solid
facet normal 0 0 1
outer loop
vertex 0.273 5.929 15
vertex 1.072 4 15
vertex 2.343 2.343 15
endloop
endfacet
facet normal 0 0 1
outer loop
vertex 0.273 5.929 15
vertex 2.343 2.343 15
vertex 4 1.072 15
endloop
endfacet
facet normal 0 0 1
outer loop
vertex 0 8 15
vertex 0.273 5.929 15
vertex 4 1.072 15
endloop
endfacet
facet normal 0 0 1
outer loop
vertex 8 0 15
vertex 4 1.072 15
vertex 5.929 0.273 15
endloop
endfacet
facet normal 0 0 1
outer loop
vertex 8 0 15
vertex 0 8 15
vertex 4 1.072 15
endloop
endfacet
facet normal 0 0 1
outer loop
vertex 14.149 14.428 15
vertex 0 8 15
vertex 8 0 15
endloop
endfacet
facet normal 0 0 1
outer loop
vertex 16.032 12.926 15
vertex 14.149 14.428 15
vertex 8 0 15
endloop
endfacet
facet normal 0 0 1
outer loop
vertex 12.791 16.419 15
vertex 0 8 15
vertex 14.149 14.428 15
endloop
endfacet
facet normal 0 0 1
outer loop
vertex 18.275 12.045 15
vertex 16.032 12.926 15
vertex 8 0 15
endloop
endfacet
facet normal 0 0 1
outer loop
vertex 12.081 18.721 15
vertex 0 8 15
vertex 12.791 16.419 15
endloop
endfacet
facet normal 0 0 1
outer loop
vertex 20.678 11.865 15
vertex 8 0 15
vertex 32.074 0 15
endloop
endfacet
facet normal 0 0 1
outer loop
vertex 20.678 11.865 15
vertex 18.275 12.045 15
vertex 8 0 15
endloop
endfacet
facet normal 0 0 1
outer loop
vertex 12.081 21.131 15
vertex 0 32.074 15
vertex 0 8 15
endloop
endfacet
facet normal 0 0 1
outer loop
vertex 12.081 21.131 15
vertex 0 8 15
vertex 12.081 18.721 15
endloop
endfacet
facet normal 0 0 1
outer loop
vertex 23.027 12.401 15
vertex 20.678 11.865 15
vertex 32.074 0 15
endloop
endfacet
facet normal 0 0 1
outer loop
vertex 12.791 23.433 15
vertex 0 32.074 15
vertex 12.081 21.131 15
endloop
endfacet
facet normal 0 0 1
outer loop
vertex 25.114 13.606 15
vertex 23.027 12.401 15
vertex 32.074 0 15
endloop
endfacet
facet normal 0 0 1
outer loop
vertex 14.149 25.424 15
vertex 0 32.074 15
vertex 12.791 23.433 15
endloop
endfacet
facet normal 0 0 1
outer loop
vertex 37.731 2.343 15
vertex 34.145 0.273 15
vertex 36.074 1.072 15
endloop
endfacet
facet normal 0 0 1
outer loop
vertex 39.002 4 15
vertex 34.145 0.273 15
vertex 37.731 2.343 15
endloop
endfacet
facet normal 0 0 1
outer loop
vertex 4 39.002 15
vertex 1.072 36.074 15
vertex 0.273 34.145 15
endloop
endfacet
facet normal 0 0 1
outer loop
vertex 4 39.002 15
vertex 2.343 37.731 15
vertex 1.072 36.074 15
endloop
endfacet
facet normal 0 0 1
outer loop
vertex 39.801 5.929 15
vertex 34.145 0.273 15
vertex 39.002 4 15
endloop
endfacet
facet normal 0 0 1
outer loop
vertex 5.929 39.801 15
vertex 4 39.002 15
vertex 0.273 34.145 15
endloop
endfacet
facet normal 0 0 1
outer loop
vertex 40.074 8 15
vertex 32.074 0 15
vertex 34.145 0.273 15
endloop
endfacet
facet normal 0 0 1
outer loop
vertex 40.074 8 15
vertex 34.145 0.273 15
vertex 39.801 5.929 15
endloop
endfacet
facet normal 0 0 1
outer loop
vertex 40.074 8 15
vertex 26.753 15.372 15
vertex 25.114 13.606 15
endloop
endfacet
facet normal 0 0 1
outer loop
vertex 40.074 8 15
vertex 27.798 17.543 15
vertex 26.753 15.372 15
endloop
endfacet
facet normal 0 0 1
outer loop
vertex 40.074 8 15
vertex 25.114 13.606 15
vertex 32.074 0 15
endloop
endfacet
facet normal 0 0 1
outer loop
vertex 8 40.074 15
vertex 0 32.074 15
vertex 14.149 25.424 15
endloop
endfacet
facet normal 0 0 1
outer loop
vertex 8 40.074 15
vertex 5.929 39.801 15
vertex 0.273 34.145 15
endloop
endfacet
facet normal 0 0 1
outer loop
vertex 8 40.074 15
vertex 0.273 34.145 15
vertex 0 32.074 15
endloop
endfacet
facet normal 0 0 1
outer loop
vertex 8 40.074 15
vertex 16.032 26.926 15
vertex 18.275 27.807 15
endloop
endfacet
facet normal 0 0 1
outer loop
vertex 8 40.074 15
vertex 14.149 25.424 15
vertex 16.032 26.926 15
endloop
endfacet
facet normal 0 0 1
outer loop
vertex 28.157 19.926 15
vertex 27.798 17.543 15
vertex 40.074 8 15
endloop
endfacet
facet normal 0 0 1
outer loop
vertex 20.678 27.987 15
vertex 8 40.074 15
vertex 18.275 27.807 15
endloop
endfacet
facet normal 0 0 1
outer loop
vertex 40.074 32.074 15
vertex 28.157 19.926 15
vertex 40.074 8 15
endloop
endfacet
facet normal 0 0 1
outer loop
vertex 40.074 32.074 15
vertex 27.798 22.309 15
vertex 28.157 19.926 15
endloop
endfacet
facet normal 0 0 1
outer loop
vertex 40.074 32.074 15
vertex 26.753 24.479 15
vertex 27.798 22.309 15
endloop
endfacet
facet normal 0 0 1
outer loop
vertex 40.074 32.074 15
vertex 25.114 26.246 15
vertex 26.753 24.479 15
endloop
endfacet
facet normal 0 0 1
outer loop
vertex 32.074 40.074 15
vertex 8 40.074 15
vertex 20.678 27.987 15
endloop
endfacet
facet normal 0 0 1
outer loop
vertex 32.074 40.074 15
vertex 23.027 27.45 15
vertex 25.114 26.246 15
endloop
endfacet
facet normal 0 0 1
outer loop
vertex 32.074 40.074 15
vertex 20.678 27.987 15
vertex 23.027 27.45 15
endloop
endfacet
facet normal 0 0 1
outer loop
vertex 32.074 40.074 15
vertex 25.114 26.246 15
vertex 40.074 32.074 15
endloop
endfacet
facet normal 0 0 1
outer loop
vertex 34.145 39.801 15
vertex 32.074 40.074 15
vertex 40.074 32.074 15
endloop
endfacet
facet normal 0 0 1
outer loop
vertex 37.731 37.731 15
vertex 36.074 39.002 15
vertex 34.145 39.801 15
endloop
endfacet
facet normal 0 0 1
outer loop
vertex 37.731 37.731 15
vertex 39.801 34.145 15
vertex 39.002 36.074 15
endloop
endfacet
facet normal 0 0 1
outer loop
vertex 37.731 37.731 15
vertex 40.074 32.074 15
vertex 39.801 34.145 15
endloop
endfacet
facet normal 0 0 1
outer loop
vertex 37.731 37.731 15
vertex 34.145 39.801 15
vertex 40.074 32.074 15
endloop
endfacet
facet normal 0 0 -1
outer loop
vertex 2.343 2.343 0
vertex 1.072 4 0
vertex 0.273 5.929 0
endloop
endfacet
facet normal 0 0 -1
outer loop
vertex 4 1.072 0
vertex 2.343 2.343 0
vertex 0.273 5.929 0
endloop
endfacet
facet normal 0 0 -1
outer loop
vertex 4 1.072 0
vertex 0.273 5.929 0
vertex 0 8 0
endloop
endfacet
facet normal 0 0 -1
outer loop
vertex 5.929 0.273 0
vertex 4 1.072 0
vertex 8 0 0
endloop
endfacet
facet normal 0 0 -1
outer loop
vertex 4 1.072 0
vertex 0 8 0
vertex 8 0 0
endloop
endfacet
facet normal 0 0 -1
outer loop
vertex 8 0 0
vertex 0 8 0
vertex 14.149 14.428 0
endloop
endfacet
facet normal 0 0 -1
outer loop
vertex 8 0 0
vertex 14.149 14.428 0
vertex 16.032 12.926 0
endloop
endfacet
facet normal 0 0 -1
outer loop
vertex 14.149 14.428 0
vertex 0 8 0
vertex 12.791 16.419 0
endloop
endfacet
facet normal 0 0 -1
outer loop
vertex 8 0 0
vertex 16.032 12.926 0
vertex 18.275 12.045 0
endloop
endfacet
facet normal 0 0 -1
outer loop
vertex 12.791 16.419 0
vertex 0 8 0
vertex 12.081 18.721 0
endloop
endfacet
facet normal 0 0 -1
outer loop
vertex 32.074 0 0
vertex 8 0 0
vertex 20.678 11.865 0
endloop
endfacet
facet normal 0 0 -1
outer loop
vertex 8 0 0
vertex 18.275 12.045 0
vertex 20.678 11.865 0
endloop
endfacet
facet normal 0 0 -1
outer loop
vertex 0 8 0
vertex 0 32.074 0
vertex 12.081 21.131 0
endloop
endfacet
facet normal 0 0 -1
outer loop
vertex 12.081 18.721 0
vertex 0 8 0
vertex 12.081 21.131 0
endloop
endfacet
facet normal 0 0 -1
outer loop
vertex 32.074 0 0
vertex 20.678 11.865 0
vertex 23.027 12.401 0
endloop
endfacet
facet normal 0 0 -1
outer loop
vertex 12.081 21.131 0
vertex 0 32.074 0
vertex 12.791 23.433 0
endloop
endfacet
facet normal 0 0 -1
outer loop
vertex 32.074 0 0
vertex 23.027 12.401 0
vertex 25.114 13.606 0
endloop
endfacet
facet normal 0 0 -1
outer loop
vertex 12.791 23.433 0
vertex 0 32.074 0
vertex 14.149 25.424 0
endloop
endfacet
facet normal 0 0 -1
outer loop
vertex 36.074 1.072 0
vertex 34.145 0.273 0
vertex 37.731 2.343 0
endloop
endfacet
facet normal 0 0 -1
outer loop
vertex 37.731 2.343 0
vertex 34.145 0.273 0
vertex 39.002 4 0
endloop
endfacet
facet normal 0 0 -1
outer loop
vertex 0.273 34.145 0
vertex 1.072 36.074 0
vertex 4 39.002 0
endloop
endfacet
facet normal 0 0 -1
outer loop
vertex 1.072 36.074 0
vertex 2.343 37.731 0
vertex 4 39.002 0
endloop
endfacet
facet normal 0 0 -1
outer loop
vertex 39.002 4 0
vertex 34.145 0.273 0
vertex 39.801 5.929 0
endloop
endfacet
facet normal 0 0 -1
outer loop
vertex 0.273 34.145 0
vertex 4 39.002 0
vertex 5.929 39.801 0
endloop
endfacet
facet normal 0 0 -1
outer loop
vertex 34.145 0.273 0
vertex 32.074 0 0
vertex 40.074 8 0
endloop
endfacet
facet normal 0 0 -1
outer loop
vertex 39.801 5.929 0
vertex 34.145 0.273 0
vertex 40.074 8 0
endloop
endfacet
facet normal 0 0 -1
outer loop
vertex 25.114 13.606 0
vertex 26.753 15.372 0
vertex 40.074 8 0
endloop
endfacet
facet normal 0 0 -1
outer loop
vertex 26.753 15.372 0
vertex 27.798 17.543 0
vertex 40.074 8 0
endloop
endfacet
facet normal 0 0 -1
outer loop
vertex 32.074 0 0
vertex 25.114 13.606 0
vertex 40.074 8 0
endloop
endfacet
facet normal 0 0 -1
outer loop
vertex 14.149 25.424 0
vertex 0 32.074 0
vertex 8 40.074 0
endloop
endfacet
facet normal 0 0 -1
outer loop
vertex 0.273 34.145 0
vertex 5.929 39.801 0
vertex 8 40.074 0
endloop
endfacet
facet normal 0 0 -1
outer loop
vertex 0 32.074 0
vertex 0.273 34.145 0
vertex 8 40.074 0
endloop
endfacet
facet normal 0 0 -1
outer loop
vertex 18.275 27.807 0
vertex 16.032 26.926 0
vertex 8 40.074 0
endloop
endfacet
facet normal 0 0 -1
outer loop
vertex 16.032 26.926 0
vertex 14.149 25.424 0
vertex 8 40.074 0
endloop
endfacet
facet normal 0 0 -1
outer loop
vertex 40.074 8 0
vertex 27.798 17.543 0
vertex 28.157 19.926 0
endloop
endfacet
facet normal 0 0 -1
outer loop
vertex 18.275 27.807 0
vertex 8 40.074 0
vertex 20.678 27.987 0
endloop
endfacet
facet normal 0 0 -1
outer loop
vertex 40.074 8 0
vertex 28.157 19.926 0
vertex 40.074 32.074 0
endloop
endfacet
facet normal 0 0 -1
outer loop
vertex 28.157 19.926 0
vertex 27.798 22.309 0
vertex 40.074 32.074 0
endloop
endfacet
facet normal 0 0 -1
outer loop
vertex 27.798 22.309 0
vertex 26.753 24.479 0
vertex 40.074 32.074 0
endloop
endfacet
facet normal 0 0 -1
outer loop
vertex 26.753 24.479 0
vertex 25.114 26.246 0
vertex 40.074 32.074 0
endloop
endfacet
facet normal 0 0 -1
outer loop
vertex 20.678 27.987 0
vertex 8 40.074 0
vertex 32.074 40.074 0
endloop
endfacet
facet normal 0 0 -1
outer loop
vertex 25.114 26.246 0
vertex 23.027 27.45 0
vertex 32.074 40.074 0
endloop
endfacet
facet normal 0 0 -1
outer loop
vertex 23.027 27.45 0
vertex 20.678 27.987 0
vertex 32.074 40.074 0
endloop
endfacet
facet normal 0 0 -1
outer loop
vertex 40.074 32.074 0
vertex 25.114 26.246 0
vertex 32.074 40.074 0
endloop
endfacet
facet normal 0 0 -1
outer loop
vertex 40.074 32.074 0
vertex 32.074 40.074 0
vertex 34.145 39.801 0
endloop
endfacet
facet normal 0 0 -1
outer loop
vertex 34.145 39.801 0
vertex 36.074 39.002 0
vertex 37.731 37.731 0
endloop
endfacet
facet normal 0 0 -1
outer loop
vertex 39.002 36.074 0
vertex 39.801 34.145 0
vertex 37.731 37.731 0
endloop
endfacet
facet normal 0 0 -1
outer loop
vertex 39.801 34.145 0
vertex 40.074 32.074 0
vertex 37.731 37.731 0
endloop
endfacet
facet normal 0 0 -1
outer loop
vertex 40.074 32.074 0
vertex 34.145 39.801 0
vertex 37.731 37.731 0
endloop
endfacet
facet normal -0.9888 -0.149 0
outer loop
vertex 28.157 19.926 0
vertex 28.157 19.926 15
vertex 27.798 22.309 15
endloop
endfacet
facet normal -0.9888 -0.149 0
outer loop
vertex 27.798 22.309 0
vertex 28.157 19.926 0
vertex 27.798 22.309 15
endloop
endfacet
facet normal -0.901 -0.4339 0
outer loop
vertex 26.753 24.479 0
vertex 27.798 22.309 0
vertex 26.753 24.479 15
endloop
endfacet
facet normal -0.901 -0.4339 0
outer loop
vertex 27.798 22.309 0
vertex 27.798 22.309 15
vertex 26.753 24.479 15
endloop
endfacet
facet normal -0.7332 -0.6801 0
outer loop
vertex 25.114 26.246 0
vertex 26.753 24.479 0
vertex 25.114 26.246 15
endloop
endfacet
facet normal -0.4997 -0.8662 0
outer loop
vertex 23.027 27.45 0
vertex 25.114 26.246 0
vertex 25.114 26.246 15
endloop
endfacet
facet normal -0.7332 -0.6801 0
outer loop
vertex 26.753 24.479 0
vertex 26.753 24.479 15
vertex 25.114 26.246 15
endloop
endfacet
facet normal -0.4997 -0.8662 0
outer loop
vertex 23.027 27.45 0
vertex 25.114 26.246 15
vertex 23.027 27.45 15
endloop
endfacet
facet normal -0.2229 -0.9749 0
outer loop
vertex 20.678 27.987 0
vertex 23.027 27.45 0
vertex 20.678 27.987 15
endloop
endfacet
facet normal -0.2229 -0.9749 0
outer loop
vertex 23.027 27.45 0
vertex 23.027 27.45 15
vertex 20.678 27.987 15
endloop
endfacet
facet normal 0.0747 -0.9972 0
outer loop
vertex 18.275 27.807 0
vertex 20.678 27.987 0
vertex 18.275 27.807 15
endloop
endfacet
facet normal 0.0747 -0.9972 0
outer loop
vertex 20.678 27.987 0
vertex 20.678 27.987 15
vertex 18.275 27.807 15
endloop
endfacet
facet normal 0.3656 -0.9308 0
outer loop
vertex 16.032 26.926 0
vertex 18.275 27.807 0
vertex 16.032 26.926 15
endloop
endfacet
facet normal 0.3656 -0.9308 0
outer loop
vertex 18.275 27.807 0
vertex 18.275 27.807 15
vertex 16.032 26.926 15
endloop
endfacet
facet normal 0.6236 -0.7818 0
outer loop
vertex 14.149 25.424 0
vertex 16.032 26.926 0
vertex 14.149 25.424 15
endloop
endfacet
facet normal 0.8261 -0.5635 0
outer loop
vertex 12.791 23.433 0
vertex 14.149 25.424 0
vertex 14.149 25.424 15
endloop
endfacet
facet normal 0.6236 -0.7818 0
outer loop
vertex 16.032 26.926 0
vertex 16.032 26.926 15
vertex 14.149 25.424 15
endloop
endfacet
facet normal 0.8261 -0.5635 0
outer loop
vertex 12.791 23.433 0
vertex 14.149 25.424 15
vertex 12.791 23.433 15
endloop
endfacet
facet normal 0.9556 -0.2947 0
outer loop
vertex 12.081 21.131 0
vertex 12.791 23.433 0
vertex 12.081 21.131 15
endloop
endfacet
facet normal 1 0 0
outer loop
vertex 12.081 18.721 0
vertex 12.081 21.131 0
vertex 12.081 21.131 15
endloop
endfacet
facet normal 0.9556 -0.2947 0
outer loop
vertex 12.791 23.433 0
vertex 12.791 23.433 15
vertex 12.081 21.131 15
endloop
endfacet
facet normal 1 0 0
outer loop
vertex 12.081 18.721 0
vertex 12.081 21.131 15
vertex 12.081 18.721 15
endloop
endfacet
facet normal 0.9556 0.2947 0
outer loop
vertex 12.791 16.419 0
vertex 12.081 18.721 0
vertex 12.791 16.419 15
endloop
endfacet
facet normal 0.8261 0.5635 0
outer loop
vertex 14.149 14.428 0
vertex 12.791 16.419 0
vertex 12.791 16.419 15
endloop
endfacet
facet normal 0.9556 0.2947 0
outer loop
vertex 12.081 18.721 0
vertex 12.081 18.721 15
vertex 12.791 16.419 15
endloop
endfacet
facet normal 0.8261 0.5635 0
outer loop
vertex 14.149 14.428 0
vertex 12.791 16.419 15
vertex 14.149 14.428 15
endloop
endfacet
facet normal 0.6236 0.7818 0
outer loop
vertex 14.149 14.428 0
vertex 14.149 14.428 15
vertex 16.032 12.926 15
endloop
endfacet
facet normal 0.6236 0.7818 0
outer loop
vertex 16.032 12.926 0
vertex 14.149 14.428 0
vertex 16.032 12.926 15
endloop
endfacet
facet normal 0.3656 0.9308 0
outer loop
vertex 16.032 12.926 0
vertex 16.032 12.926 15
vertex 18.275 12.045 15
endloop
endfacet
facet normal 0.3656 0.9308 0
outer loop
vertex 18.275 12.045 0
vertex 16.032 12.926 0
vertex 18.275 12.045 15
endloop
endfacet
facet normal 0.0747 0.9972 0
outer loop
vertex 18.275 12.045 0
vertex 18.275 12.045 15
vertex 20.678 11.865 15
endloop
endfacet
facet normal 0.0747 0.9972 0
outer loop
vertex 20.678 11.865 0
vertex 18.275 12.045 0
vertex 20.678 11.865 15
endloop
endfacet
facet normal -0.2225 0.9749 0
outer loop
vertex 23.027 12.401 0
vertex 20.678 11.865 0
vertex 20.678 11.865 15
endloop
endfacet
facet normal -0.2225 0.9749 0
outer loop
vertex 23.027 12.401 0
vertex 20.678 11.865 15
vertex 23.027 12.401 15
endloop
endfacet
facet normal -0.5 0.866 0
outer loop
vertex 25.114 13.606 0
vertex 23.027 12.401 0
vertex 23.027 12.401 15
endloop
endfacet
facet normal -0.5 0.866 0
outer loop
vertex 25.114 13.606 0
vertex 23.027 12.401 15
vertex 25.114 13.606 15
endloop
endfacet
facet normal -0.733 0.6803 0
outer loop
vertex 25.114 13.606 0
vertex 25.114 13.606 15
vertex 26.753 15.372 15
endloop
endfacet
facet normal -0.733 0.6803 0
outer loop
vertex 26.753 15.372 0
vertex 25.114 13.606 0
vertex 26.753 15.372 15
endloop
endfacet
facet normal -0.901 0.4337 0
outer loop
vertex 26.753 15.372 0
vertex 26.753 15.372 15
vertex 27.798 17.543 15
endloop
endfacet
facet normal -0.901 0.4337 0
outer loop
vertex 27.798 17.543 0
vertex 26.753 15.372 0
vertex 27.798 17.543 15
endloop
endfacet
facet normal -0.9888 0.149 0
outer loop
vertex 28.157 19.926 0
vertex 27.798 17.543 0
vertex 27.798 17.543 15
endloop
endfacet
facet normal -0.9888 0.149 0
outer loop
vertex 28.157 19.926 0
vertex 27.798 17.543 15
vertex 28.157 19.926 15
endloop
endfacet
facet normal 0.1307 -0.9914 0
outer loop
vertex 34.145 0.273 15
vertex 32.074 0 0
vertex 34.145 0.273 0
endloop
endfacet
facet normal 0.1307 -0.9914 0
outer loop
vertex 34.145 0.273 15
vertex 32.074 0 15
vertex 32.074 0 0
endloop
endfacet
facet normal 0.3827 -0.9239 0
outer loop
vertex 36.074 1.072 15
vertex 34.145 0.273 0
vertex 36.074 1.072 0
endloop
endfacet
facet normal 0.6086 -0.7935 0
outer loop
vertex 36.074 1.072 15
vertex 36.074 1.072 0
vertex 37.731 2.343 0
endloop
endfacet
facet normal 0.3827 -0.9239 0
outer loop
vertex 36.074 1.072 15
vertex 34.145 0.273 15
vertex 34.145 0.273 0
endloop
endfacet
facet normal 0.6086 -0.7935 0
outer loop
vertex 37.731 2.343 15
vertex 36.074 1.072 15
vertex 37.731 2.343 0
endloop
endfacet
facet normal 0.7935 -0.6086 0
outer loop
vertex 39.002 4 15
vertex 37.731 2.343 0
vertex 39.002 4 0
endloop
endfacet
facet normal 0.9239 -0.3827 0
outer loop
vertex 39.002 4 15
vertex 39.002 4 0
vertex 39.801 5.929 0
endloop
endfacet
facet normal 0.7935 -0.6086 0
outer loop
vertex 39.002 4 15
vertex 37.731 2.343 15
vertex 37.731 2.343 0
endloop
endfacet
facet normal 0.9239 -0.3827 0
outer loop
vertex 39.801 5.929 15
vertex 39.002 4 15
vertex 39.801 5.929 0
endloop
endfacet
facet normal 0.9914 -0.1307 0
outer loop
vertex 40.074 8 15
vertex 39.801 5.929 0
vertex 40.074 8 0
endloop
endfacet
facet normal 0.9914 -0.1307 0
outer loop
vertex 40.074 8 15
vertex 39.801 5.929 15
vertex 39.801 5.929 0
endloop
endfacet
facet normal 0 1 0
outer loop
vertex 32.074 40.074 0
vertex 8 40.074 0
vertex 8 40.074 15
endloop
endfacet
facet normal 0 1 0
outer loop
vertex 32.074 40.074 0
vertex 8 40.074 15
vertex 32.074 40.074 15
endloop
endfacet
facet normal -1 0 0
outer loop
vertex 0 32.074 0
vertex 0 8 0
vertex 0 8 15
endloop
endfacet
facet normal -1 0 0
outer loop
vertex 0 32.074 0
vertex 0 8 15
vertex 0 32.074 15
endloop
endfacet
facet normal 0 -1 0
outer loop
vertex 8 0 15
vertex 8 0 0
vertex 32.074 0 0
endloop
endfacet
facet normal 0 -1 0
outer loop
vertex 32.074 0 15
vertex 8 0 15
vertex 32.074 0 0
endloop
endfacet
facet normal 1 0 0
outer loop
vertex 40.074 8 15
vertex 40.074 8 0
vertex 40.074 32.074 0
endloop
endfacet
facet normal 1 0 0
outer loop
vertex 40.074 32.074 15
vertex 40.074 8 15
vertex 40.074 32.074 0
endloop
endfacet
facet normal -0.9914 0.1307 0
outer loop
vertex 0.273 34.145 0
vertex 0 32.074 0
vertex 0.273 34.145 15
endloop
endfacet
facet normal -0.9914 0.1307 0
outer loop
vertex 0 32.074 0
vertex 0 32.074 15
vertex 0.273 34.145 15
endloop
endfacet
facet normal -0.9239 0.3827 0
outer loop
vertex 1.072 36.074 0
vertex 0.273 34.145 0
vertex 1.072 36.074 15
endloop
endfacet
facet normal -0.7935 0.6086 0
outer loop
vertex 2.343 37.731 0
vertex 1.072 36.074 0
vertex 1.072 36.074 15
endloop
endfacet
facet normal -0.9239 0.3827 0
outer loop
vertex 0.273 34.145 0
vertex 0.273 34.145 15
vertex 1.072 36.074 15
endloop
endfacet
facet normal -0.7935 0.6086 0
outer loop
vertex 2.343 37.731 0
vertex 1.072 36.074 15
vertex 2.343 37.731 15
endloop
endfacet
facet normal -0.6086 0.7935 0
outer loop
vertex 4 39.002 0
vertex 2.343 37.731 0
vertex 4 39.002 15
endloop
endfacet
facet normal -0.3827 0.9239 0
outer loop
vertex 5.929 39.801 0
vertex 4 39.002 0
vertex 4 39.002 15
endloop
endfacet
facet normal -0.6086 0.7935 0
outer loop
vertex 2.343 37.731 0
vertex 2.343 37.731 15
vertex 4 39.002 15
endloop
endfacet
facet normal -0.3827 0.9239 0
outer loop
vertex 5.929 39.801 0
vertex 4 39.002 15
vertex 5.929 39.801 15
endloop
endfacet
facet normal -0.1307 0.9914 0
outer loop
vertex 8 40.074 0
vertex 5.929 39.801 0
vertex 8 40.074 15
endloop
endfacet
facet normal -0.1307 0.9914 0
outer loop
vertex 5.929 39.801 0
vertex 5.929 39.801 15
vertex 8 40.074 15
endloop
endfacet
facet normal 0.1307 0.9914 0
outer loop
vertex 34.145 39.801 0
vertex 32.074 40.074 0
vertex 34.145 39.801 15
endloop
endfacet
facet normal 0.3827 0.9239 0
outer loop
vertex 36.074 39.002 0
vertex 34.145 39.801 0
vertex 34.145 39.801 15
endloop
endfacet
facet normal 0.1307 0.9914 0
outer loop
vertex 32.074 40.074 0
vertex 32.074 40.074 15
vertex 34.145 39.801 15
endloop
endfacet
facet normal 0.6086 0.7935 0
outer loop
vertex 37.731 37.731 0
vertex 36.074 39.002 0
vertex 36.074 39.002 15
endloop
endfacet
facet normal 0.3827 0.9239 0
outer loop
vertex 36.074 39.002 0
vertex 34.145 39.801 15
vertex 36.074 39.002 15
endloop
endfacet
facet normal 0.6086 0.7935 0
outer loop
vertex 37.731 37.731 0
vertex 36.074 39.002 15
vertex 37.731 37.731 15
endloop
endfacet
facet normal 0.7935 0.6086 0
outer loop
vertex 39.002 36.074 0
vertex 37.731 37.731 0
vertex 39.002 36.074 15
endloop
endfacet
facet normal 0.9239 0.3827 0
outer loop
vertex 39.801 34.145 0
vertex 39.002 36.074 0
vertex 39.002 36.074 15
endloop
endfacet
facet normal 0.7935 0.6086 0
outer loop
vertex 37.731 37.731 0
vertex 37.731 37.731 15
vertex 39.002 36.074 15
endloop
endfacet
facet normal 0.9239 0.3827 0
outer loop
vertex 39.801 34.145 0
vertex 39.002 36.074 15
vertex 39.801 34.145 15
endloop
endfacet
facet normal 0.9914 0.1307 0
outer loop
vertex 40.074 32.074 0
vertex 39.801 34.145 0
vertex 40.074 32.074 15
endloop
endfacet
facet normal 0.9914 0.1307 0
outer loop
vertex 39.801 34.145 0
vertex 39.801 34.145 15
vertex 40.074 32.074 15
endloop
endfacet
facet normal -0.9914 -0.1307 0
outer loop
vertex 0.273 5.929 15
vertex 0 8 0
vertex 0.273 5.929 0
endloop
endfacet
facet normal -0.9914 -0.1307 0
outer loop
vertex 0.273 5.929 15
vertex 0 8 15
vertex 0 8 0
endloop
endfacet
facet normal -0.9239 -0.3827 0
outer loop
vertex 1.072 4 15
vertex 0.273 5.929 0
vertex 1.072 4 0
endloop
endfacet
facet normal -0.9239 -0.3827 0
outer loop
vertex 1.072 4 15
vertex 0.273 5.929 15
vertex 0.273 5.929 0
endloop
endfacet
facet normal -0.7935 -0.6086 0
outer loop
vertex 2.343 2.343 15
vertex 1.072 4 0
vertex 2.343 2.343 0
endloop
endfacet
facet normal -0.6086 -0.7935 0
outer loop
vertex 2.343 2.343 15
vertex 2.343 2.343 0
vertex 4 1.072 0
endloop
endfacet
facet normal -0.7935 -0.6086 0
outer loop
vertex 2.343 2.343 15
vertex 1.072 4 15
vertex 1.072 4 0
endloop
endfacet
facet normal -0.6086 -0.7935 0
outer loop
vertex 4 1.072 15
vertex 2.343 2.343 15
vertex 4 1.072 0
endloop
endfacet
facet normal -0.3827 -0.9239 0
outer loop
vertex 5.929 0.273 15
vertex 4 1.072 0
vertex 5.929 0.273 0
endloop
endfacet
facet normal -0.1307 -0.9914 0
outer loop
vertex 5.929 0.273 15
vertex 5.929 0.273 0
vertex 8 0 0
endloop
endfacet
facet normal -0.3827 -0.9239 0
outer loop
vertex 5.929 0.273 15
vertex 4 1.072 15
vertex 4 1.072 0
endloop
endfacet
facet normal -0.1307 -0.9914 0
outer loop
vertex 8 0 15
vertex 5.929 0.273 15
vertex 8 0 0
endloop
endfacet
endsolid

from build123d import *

# Parameters (mm, degrees)
SKETCH_W     = 40.07407
SKETCH_H     = 40.074074
PAD_DEPTH    = 15
SKETCH001_R  = 8.083249
POCKET_DEPTH = 15.001
FILLET_R     = 8


with BuildPart() as part:
    # Sketch → Pad (new body)
    with BuildSketch(Plane.XY):
        with Locations((20.037035, 20.037037)):
            Rectangle(SKETCH_W, SKETCH_H)
    extrude(amount=PAD_DEPTH)

    # Sketch001 (on Face6 of Pad) → Pocket (cut, through all)
    with BuildSketch(Plane.XY.offset(15)):
        with Locations((20.074074, 19.925928)):
            Circle(SKETCH001_R)
    extrude(amount=-POCKET_DEPTH, mode=Mode.SUBTRACT)

    # Fillet
    fillet_edges = [part.edges().sort_by_distance(p)[0] for p in [
        (40.07407, 0, 7.5),
        (40.07407, 40.074074, 7.5),
        (0, 40.074074, 7.5),
        (0, 0, 7.5),
    ]]
    fillet(fillet_edges, radius=FILLET_R)


solid = part.part
